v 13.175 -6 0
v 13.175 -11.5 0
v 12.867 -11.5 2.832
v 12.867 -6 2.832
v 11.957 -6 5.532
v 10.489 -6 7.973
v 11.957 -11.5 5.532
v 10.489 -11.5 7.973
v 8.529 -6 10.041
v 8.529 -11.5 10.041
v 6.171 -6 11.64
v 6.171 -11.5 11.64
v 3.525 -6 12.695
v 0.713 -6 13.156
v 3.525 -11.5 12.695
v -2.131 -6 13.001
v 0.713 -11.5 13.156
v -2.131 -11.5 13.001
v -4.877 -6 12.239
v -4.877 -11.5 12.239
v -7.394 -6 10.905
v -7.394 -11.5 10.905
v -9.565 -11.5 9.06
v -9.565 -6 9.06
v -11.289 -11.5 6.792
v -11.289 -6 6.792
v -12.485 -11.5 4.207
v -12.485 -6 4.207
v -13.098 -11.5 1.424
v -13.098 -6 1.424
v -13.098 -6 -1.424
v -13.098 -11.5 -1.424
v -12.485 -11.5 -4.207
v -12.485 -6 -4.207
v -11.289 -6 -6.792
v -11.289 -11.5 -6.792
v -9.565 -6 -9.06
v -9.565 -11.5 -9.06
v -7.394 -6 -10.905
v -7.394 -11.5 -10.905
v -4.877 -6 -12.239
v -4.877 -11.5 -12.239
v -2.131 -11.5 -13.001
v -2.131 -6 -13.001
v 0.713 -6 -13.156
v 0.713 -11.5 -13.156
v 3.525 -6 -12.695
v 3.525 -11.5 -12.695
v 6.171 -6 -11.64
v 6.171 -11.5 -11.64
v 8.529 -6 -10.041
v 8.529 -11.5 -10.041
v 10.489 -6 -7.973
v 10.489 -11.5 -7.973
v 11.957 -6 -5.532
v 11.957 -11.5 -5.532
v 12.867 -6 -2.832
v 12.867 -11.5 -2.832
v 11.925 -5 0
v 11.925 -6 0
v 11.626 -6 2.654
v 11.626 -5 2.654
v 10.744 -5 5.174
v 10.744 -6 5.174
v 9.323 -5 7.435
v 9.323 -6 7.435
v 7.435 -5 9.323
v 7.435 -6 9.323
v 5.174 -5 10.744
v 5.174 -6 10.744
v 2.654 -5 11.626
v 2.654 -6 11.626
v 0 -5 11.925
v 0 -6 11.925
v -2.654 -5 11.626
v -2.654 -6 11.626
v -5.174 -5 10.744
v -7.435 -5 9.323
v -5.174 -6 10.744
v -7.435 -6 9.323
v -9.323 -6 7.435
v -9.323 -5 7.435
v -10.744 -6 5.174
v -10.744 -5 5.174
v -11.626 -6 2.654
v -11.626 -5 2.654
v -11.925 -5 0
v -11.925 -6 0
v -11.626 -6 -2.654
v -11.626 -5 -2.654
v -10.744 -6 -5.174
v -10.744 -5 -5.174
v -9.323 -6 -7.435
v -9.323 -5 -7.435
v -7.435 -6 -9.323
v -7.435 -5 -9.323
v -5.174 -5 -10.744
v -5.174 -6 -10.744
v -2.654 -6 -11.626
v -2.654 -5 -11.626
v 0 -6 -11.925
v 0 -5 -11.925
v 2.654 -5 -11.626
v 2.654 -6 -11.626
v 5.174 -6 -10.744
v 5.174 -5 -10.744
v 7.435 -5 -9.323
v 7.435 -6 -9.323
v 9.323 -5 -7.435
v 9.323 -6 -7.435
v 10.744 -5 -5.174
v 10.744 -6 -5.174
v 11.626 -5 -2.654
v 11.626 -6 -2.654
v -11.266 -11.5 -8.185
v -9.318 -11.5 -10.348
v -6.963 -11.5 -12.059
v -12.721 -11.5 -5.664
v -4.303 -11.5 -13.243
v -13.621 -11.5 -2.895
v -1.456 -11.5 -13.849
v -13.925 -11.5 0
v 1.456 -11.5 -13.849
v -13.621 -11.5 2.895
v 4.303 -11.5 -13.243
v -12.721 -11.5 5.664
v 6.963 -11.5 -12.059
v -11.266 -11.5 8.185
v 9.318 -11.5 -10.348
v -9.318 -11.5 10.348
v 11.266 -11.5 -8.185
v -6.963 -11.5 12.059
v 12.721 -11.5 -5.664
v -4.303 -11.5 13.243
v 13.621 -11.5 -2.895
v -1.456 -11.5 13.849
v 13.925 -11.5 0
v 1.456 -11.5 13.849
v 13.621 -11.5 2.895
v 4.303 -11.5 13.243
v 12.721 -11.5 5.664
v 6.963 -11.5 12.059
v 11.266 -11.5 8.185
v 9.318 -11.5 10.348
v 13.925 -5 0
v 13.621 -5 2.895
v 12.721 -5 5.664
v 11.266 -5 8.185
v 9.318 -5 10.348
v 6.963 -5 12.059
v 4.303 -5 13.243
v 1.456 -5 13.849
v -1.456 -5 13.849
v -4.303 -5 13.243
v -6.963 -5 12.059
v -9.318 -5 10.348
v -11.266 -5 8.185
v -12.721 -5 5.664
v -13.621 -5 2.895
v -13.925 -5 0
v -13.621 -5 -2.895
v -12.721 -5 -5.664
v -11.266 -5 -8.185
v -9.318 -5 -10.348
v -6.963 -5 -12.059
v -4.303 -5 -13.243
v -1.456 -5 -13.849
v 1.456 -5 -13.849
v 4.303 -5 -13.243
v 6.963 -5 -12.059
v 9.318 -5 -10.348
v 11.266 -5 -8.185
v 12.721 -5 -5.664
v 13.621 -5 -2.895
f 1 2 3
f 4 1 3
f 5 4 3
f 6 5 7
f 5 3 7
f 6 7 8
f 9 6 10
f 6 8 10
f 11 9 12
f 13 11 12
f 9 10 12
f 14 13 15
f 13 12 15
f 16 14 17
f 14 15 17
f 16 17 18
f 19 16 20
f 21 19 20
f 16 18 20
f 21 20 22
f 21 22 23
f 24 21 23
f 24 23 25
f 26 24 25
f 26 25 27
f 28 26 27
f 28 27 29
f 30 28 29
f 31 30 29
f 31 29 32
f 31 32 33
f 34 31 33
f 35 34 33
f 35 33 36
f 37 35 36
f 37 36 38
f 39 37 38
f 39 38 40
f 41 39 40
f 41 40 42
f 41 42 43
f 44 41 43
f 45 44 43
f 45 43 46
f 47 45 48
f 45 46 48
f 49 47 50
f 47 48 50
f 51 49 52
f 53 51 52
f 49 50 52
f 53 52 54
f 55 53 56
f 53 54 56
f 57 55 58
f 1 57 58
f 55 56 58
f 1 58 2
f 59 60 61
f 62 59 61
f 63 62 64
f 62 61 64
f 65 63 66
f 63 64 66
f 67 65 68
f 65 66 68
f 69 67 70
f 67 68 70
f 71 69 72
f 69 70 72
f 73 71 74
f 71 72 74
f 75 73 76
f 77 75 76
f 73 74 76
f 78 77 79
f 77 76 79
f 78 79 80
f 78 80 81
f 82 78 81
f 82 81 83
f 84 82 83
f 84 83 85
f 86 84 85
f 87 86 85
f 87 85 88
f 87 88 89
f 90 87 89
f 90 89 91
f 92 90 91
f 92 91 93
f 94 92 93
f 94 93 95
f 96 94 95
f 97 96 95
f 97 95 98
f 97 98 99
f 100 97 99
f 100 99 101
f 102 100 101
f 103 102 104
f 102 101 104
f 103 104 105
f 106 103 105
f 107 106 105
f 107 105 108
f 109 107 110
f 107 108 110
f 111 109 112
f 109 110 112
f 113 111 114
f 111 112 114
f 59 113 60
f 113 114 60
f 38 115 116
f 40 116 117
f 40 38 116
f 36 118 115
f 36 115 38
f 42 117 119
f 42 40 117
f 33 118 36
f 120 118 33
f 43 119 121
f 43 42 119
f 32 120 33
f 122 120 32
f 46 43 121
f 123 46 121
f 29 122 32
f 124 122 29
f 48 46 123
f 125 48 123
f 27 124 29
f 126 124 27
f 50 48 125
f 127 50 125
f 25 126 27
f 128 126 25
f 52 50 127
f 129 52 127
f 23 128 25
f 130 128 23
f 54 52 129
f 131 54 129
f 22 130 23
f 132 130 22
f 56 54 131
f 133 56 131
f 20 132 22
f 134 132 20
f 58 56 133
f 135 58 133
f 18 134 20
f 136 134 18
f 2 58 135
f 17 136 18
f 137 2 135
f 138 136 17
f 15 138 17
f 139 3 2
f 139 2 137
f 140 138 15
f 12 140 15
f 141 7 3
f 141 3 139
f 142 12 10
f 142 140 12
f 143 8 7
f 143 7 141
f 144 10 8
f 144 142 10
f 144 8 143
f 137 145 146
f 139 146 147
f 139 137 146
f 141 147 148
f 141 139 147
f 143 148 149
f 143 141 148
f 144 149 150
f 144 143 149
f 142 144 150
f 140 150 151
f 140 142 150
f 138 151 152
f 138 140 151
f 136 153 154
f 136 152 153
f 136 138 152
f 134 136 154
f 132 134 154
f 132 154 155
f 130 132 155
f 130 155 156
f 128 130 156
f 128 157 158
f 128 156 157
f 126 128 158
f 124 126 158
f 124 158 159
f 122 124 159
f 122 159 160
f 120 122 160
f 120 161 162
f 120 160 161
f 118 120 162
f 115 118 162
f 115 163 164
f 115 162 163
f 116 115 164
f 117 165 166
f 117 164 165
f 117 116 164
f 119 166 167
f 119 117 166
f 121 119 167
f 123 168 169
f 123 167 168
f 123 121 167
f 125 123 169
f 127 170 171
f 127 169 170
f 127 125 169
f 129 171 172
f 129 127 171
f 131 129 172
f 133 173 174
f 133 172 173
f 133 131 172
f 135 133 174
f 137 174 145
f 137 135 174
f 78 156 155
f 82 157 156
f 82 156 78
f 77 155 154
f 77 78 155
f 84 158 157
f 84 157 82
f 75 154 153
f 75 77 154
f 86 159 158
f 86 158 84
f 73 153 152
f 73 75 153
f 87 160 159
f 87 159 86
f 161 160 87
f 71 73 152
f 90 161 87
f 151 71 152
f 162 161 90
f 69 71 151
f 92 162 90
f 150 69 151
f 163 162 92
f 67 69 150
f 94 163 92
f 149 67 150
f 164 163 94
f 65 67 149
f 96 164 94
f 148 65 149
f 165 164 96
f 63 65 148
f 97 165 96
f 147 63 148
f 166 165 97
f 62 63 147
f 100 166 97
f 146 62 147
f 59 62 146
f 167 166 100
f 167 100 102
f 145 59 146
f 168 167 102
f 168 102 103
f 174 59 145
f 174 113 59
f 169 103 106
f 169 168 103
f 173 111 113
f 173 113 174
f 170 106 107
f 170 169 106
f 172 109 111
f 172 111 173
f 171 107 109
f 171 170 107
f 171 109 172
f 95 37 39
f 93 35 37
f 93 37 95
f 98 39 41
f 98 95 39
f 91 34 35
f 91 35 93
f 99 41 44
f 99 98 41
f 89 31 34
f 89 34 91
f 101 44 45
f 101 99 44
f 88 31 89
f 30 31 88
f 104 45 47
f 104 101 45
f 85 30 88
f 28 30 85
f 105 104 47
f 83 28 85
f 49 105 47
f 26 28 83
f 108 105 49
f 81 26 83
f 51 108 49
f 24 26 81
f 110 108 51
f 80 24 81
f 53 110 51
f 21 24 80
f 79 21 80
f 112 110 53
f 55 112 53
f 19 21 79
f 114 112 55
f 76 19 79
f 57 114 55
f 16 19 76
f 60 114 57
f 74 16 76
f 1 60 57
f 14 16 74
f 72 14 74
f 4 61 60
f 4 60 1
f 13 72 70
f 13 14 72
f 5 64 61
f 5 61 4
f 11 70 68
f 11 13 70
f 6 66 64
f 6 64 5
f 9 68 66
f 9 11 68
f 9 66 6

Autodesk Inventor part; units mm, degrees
ref_plane "YZ Plane" through (0, 0, 0) normal (1, 0, 0) x (0, 1, 0)
ref_plane "XZ Plane" through (0, 0, 0) normal (0, 1, 0) x (-1, 0, 0)
ref_plane "XY Plane" through (0, 0, 0) normal (0, 0, 1) x (1, 0, 0)
sketch "Sketch1" plane through (0, 0, 0) normal (0, 0, 1) x (1, 0, 0)
  line L0 (0, 0) -> (13.925, 0)
  line L1 (13.925, 0) -> (13.925, -11.5)
  line L2 (13.925, -11.5) -> (0, -11.5) construction
  line L3 (0, -11.5) -> (0, 0) construction
  line L4 (13.925, 0) -> (0, 0)
  line L5 (0, 0) -> (0, -3.5)
  line L6 (0, -3.5) -> (13.925, -3.5)
  line L7 (13.925, -3.5) -> (13.925, 0)
  line L8 (13.925, 0) -> (11.925, 0)
  line L9 (11.925, 0) -> (11.925, -6)
  line L10 (11.925, -6) -> (13.925, -6)
  line L11 (13.925, -6) -> (13.925, 0)
  line L12 (13.925, -6) -> (13.175, -6)
  line L13 (13.175, -6) -> (13.175, -11.5)
  line L14 (13.175, -11.5) -> (13.925, -11.5)
  line L15 (13.925, -11.5) -> (13.925, -6)
  line L16 (0, 0) -> (2.5, 0)
  line L17 (2.5, 0) -> (2.5, 14.25)
  line L18 (2.5, 14.25) -> (0, 14.25)
  line L19 (0, 14.25) -> (0, 0)
  line L20 (0, -3.5) -> (2, -3.5)
  line L21 (2, -3.5) -> (2, -6.5)
  line L22 (2, -6.5) -> (0, -6.5)
  line L23 (0, -6.5) -> (0, -3.5)
  line L24 (2, -6.5) -> (4.5, -3.5)
  line L25 (0, -3.5) -> (1.5, -3.5)
  line L26 (1.5, -3.5) -> (1.5, -6.5)
  line L27 (1.5, -6.5) -> (0, -6.5)
  line L28 (0, -6.5) -> (0, -3.5)
  line L29 (1.5, -6.5) -> (0, -6.5)
  line L30 (0, -6.5) -> (0, -0.5)
  line L31 (0, -0.5) -> (1.5, -0.5)
  line L32 (1.5, -0.5) -> (1.5, -6.5)
  point P0 (11.925, -3.5)
  point P1 (1.5, -3.5)
  point P2 (1.5, -3.5)
  dimension "d0" = 13.925
  dimension "d1" = 11.5
  dimension "d2" = 3.5
  dimension "d3" = 2
  dimension "d5" = 5.5
  dimension "d6" = 0.75
  dimension "d7" = 2.5
  dimension "d8" = 14.25
  dimension "d13" = 2
  dimension "d14" = 3
  dimension "d15" = 4.5
  dimension "d16" = 1.5
  dimension "d53" = 6
revolve "Revolution1" add sketch "Sketch1" angle 360 about axis through (0, 14.25, 0) along (0, -1, 0) contours L19 L18 L17 L0 | L0 L9 L6 L32 L31 L5 | L0 L1 L6 L9 | L6 L1 L10 L9 | L6 L21 L22 L26 | L24 L21 L6 | L1 L14 L13 L10
chamfer "Chamfer1" distance 2 angle 45 1 edges at (-13.925, 0, 0)
sketch "Sketch4" plane through (0, -3.5, 0) normal (0, -1, 0) x (1, 0, 0)
  line L0 (0, 0) -> (0, 13.925) construction
  circle A0 centre (0, 0) radius 13.925 projected
  circle A1 centre (0, 0) radius 11.925 projected
  circle A2 centre (0, 0) radius 4.5 projected
  arc A3 (-1.9387, 6.0086) -> (1.9387, 6.0086) centre (0, 6.5) ccw
  line L1 (-1, -13.889) -> (1, -13.889) construction
  line L2 (1, -13.889) -> (1, -4.3875) construction
  line L3 (1, -4.3875) -> (-1, -4.3875) construction
  line L4 (-1, -4.3875) -> (-1, -13.889) construction
  line L5 (-1, -13.889) -> (1, -4.3875) construction
  line L6 (1, -13.889) -> (-1, -4.3875) construction
  circle A4 centre (0, 0) radius 4.5 projected
  circle A5 centre (0, 0) radius 11.925 projected
  line L7 (-3.319, 11.4538) -> (-1.9387, 6.0086)
  line L8 (3.4812, 12.0939) -> (1.9387, 6.0086)
  line L9 (2.0542, -4.0038) -> (8.1617, -11.2824) construction
  line L10 (9.6938, -9.9968) -> (3.5863, -2.7182) construction
  line L11 (4.1472, -1.7467) -> (13.5044, -3.3966) construction
  line L12 (13.8517, -1.427) -> (4.4945, 0.2229) construction
  line L13 (4.2997, 1.3277) -> (12.5283, 6.0785) construction
  line L14 (11.5283, 7.8105) -> (3.2997, 3.0598) construction
  line L15 (2.4403, 3.7809) -> (5.69, 12.7094) construction
  line L16 (3.8106, 13.3935) -> (0.5609, 4.4649) construction
  line L17 (-0.5609, 4.4649) -> (-3.8106, 13.3935) construction
  line L18 (-5.69, 12.7094) -> (-2.4403, 3.7809) construction
  line L19 (-3.2997, 3.0598) -> (-11.5283, 7.8105) construction
  line L20 (-12.5283, 6.0785) -> (-4.2997, 1.3277) construction
  line L21 (-4.4945, 0.2229) -> (-13.8517, -1.427) construction
  line L22 (-13.5044, -3.3966) -> (-4.1472, -1.7467) construction
  line L23 (-3.5863, -2.7182) -> (-9.6938, -9.9968) construction
  line L24 (-8.1617, -11.2824) -> (-2.0542, -4.0038) construction
  line L25 (-5.1071, 11.5022) -> (-2.3771, 5.849)
  arc A6 (-5.3474, 3.3567) -> (-2.3771, 5.849) centre (-4.1781, 4.9793) ccw
  line L26 (-9.9049, 6.6407) -> (-5.3474, 3.3567)
  line L27 (-11.3057, 5.5284) -> (-5.5806, 2.9526)
  arc A7 (-6.2539, -0.8659) -> (-5.5806, 2.9526) centre (-6.4013, 1.1287) ccw
  line L28 (-11.8561, -1.2796) -> (-6.2539, -0.8659)
  line L29 (-12.2143, -3.0321) -> (-6.1729, -1.3253)
  arc A8 (-4.2342, -4.6832) -> (-6.1729, -1.3253) centre (-5.6292, -3.25) ccw
  line L30 (-8.2598, -8.6012) -> (-4.2342, -4.6832)
  line L31 (-7.4077, -10.1739) -> (-3.8768, -4.9831)
  arc A9 (-0.2333, -6.3093) -> (-3.8768, -4.9831) centre (-2.2231, -6.108) ccw
  line L32 (-0.7986, -11.8982) -> (-0.2333, -6.3093)
  line L33 (0.8651, -12.5552) -> (0.2333, -6.3093)
  arc A10 (3.8768, -4.9831) -> (0.2333, -6.3093) centre (2.2231, -6.108) ccw
  line L34 (7.0363, -9.6279) -> (3.8768, -4.9831)
  line L35 (8.733, -9.0618) -> (4.2342, -4.6832)
  arc A11 (6.1729, -1.3253) -> (4.2342, -4.6832) centre (5.6292, -3.25) ccw
  line L36 (11.5788, -2.8526) -> (6.1729, -1.3253)
  line L37 (12.5147, -1.3283) -> (6.2539, -0.8659)
  arc A12 (5.5806, 2.9526) -> (6.2539, -0.8659) centre (6.4013, 1.1287) ccw
  line L38 (10.7035, 5.2575) -> (5.5806, 2.9526)
  line L39 (10.4406, 7.0268) -> (5.3474, 3.3567)
  arc A13 (2.3771, 5.849) -> (5.3474, 3.3567) centre (4.1781, 4.9793) ccw
  line L40 (4.8199, 10.9075) -> (2.3771, 5.849)
  arc A14 (-2.2939, 11.7023) -> (-3.0709, 10.4752) centre (-2.1016, 10.721) ccw
  arc A15 (3.0709, 10.4752) -> (2.2939, 11.7023) centre (2.1016, 10.721) ccw
  arc A16 (-4.3809, 9.9985) -> (-5.7648, 10.439) centre (-5.2814, 9.5636) ccw
  arc A17 (-9.2793, 7.49) -> (-9.0858, 6.0506) centre (-8.5012, 6.8619) ccw
  arc A18 (-9.7828, 4.8433) -> (-11.1262, 4.2912) centre (-10.1932, 3.9313) ccw
  arc A19 (-11.9228, -0.227) -> (-10.8494, -1.2053) centre (-10.923, -0.208) ccw
  arc A20 (-10.6073, -2.5781) -> (-11.2814, -3.8645) centre (-10.3354, -3.5405) ccw
  arc A21 (-8.9875, -7.8378) -> (-7.5364, -7.8971) centre (-8.2338, -7.1805) ccw
  arc A22 (-6.4685, -8.7932) -> (-6.158, -10.212) centre (-5.6416, -9.3556) ccw
  arc A23 (-1.8468, -11.7811) -> (-0.697, -10.8938) centre (-1.6919, -10.7932) ccw
  arc A24 (0.697, -10.8938) -> (1.8468, -11.7811) centre (1.6919, -10.7932) ccw
  arc A25 (6.158, -10.212) -> (6.4685, -8.7932) centre (5.6416, -9.3556) ccw
  arc A26 (7.5364, -7.8971) -> (8.9875, -7.8378) centre (8.2338, -7.1805) ccw
  arc A27 (11.2814, -3.8645) -> (10.6073, -2.5781) centre (10.3354, -3.5405) ccw
  arc A28 (10.8494, -1.2053) -> (11.9228, -0.227) centre (10.923, -0.208) ccw
  arc A29 (11.1262, 4.2912) -> (9.7828, 4.8433) centre (10.1932, 3.9313) ccw
  arc A30 (9.0858, 6.0506) -> (9.2793, 7.49) centre (8.5012, 6.8619) ccw
  arc A31 (5.7648, 10.439) -> (4.3809, 9.9985) centre (5.2814, 9.5636) ccw
  point P0 (0, -9.1383)
  point P1 (-5.69, 12.7094)
  point P2 (-11.5283, 7.8105)
  point P3 (-12.5283, 6.0785)
  point P4 (-13.8517, -1.427)
  point P5 (-13.5044, -3.3966)
  point P6 (-8.1617, -11.2824)
  point P7 (-1, -13.889)
  point P8 (1, -13.889)
  point P9 (8.1617, -11.2824)
  point P10 (9.6938, -9.9968)
  point P11 (13.5044, -3.3966)
  point P12 (13.8517, -1.427)
  point P13 (12.5283, 6.0785)
  point P14 (11.5283, 7.8105)
  point P15 (5.69, 12.7094)
  point P16 (9.0858, 6.0506)
  point P17 (11.1262, 4.2912)
  point P18 (10.8494, -1.2053)
  point P19 (11.9228, -0.227)
  point P20 (10.6073, -2.5781)
  point P21 (8.9875, -7.8378)
  point P22 (6.4685, -8.7932)
  point P23 (0.697, -10.8938)
  point P24 (1.8468, -11.7811)
  point P25 (-1.8468, -11.7811)
  point P26 (-0.697, -10.8938)
  point P27 (-10.6073, -2.5781)
  point P28 (-10.8494, -1.2053)
  point P29 (-9.2793, 7.49)
  point P30 (-9.0858, 6.0506)
  point P31 (-5.7648, 10.439)
  point P32 (2.2939, 11.7023)
  point P33 (-2.2939, 11.7023)
  dimension "d31" = 4
  dimension "d32" = 2
  dimension "d39" = 360
  dimension "d43" = 360
  dimension "d45" = 2
  dimension "d48" = 360
extrude "Extrusion2" cut sketch "Sketch4" against normal blind 3 contours A1 A28 L37 A12 L38 A29 | A30 L39 A13 L40 A31 A1 | A1 A26 L35 A11 L36 A27 | A3 L7 A14 A1 A15 L8 | A10 L34 A25 A1 A24 L33 | A6 L26 A17 A1 A16 L25 | A9 L32 A23 A1 A22 L31 | A7 L28 A19 A1 A18 L27 | A8 L30 A21 A1 A20 L29
sketch "Sketch2" plane through (0, 0, 0) normal (0, 1, 0) x (1, 0, 0)
  circle A0 centre (0, 0) radius 1.5 projected
  circle A1 centre (0, 0) radius 11.5
  line L0 (0, 0) -> (0, 13.925) construction
  circle A2 centre (0, 0) radius 13.925 projected
  line L1 (-1, 16.3936) -> (-1, 11.4564)
  line L2 (-1, 11.4564) -> (1, 11.4564) construction
  line L3 (1, 11.4564) -> (1, 16.3936)
  line L4 (1, 16.3936) -> (-1, 16.3936)
  line L5 (-1, 16.3936) -> (1, 11.4564) construction
  line L6 (-1, 11.4564) -> (1, 16.3936) construction
  line L7 (-11.3036, 11.9154) -> (-8.1301, 8.1334)
  line L8 (-8.1301, 8.1334) -> (-6.598, 9.4189) construction
  line L9 (-6.598, 9.4189) -> (-9.7715, 13.201)
  line L10 (-9.7715, 13.201) -> (-11.3036, 11.9154)
  line L11 (-16.3182, 1.8619) -> (-11.456, 1.0046)
  line L12 (-11.456, 1.0046) -> (-11.1087, 2.9742) construction
  line L13 (-11.1087, 2.9742) -> (-15.9709, 3.8315)
  line L14 (-15.9709, 3.8315) -> (-16.3182, 1.8619)
  line L15 (-13.6972, -9.0628) -> (-9.4216, -6.5942)
  line L16 (-9.4216, -6.5942) -> (-10.4216, -4.8622) construction
  line L17 (-10.4216, -4.8622) -> (-14.6972, -7.3308)
  line L18 (-14.6972, -7.3308) -> (-13.6972, -9.0628)
  line L19 (-4.6672, -15.7469) -> (-2.9786, -11.1076)
  line L20 (-2.9786, -11.1076) -> (-4.858, -10.4235) construction
  line L21 (-4.858, -10.4235) -> (-6.5466, -15.0629)
  line L22 (-6.5466, -15.0629) -> (-4.6672, -15.7469)
  line L23 (6.5466, -15.0629) -> (4.858, -10.4235)
  line L24 (4.858, -10.4235) -> (2.9786, -11.1076) construction
  line L25 (2.9786, -11.1076) -> (4.6672, -15.7469)
  line L26 (4.6672, -15.7469) -> (6.5466, -15.0629)
  line L27 (14.6972, -7.3308) -> (10.4216, -4.8622)
  line L28 (10.4216, -4.8622) -> (9.4216, -6.5942) construction
  line L29 (9.4216, -6.5942) -> (13.6972, -9.0628)
  line L30 (13.6972, -9.0628) -> (14.6972, -7.3308)
  line L31 (15.9709, 3.8315) -> (11.1087, 2.9742)
  line L32 (11.1087, 2.9742) -> (11.456, 1.0046) construction
  line L33 (11.456, 1.0046) -> (16.3182, 1.8619)
  line L34 (16.3182, 1.8619) -> (15.9709, 3.8315)
  line L35 (9.7715, 13.201) -> (6.598, 9.4189)
  line L36 (6.598, 9.4189) -> (8.1301, 8.1334) construction
  line L37 (8.1301, 8.1334) -> (11.3036, 11.9154)
  line L38 (11.3036, 11.9154) -> (9.7715, 13.201)
  arc A3 (6.3519, 11.0119) -> (2.2125, 12.5185) centre (0, 0) ccw construction
  arc A4 (6.9577, 12.0622) -> (2.4235, 13.7125) centre (0, 0) ccw
  arc A5 (5.746, 9.9616) -> (2.0015, 11.3245) centre (0, 0) ccw
  arc A6 (5.746, 9.9616) -> (6.9577, 12.0622) centre (6.3519, 11.0119) ccw
  arc A7 (2.4235, 13.7125) -> (2.0015, 11.3245) centre (2.2125, 12.5185) ccw
  arc A8 (-6.9577, 12.0622) -> (-5.746, 9.9616) centre (-6.3519, 11.0119) ccw
  arc A9 (-2.4235, 13.7125) -> (-6.9577, 12.0622) centre (0, 0) ccw
  arc A10 (-2.2125, 12.5185) -> (-6.3519, 11.0119) centre (0, 0) ccw construction
  arc A11 (-2.0015, 11.3245) -> (-2.4235, 13.7125) centre (-2.2125, 12.5185) ccw
  arc A12 (-2.0015, 11.3245) -> (-5.746, 9.9616) centre (0, 0) ccw
  arc A13 (-13.0833, 4.7679) -> (-10.8049, 3.9375) centre (-11.9441, 4.3527) ccw
  arc A14 (-10.6707, 8.9466) -> (-13.0833, 4.7679) centre (0, 0) ccw
  arc A15 (-9.7416, 8.1675) -> (-11.9441, 4.3527) centre (0, 0) ccw construction
  arc A16 (-8.8125, 7.3885) -> (-10.6707, 8.9466) centre (-9.7416, 8.1675) ccw
  arc A17 (-8.8125, 7.3885) -> (-10.8049, 3.9375) centre (0, 0) ccw
  arc A18 (-13.0871, -4.7574) -> (-10.808, -3.9289) centre (-11.9476, -4.3432) ccw
  arc A19 (-13.925, -0.0056) -> (-13.0871, -4.7574) centre (0, 0) ccw
  arc A20 (-12.7125, -0.0051) -> (-11.9476, -4.3432) centre (0, 0) ccw construction
  arc A21 (-11.5, -0.0046) -> (-13.925, -0.0056) centre (-12.7125, -0.0051) ccw
  arc A22 (-11.5, -0.0046) -> (-10.808, -3.9289) centre (0, 0) ccw
  arc A23 (-6.9673, -12.0566) -> (-5.754, -9.957) centre (-6.3606, -11.0068) ccw
  arc A24 (-10.6636, -8.9551) -> (-6.9673, -12.0566) centre (0, 0) ccw
  arc A25 (-9.7351, -8.1753) -> (-6.3606, -11.0068) centre (0, 0) ccw construction
  arc A26 (-8.8066, -7.3956) -> (-10.6636, -8.9551) centre (-9.7351, -8.1753) ccw
  arc A27 (-8.8066, -7.3956) -> (-5.754, -9.957) centre (0, 0) ccw
  arc A28 (2.4126, -13.7144) -> (1.9924, -11.3261) centre (2.2025, -12.5202) ccw
  arc A29 (-2.4126, -13.7144) -> (2.4126, -13.7144) centre (0, 0) ccw
  arc A30 (-2.2025, -12.5202) -> (2.2025, -12.5202) centre (0, 0) ccw construction
  arc A31 (-1.9924, -11.3261) -> (-2.4126, -13.7144) centre (-2.2025, -12.5202) ccw
  arc A32 (-1.9924, -11.3261) -> (1.9924, -11.3261) centre (0, 0) ccw
  arc A33 (10.6636, -8.9551) -> (8.8066, -7.3956) centre (9.7351, -8.1753) ccw
  arc A34 (6.9673, -12.0566) -> (10.6636, -8.9551) centre (0, 0) ccw
  arc A35 (6.3606, -11.0068) -> (9.7351, -8.1753) centre (0, 0) ccw construction
  arc A36 (5.754, -9.957) -> (6.9673, -12.0566) centre (6.3606, -11.0068) ccw
  arc A37 (5.754, -9.957) -> (8.8066, -7.3956) centre (0, 0) ccw
  arc A38 (13.925, -0.0056) -> (11.5, -0.0046) centre (12.7125, -0.0051) ccw
  arc A39 (13.0871, -4.7574) -> (13.925, -0.0056) centre (0, 0) ccw
  arc A40 (11.9476, -4.3432) -> (12.7125, -0.0051) centre (0, 0) ccw construction
  arc A41 (10.808, -3.9289) -> (13.0871, -4.7574) centre (11.9476, -4.3432) ccw
  arc A42 (10.808, -3.9289) -> (11.5, -0.0046) centre (0, 0) ccw
  arc A43 (10.6707, 8.9466) -> (8.8125, 7.3885) centre (9.7416, 8.1675) ccw
  arc A44 (13.0833, 4.7679) -> (10.6707, 8.9466) centre (0, 0) ccw
  arc A45 (11.9441, 4.3527) -> (9.7416, 8.1675) centre (0, 0) ccw construction
  arc A46 (10.8049, 3.9375) -> (13.0833, 4.7679) centre (11.9441, 4.3527) ccw
  arc A47 (10.8049, 3.9375) -> (8.8125, 7.3885) centre (0, 0) ccw
  point P0 (-8.9508, 10.6672)
  point P1 (-13.7134, 2.4181)
  point P2 (-12.0594, -6.9625)
  point P3 (-4.7626, -13.0852)
  point P4 (4.7626, -13.0852)
  point P5 (12.0594, -6.9625)
  point P6 (13.7134, 2.4181)
  point P7 (8.9508, 10.6672)
  point P8 (-1, 11.4564)
  point P9 (-8.1301, 8.1334)
  point P10 (-11.456, 1.0046)
  point P11 (-9.4216, -6.5942)
  point P12 (-2.9786, -11.1076)
  point P13 (4.858, -10.4235)
  point P14 (10.4216, -4.8622)
  point P15 (11.1087, 2.9742)
  point P16 (-8.1617, 11.2824)
  point P17 (-7.2807, 10.2325)
  point P18 (-5.746, 9.9616)
  point P19 (-2.0015, 11.3245)
  point P20 (-1, 12.5185)
  point P21 (-1, 13.889)
  point P22 (-13.5044, 3.3966)
  point P23 (-12.1547, 3.1586)
  point P24 (-8.8125, 7.3885)
  point P25 (-8.8128, 8.9469)
  point P26 (-9.6938, 9.9968)
  point P27 (-12.5283, -6.0785)
  point P28 (-11.3413, -5.3932)
  point P29 (-10.808, -3.9289)
  point P30 (-11.5, -0.0046)
  point P31 (-12.502, 1.189)
  point P32 (-13.8517, 1.427)
  point P33 (-5.69, -12.7094)
  point P34 (-5.2213, -11.4215)
  point P35 (-5.754, -9.957)
  point P36 (-8.8066, -7.3956)
  point P37 (-10.3413, -7.1253)
  point P38 (-11.5283, -7.8105)
  point P39 (3.8106, -13.3935)
  point P40 (3.3419, -12.1055)
  point P41 (1.9924, -11.3261)
  point P42 (-3.3419, -12.1055)
  point P43 (-3.8106, -13.3935)
  point P44 (11.5283, -7.8105)
  point P45 (10.3413, -7.1253)
  point P46 (5.754, -9.957)
  point P47 (5.2213, -11.4215)
  point P48 (5.69, -12.7094)
  point P49 (13.8517, 1.427)
  point P50 (12.502, 1.189)
  point P51 (11.5, -0.0046)
  point P52 (10.808, -3.9289)
  point P53 (11.3413, -5.3932)
  point P54 (12.5283, -6.0785)
  point P55 (9.6938, 9.9968)
  point P56 (8.8128, 8.9469)
  point P57 (8.8125, 7.3885)
  point P58 (10.8049, 3.9375)
  point P59 (12.1547, 3.1586)
  point P60 (13.5044, 3.3966)
  point P61 (1, 12.5185)
  point P62 (2.0015, 11.3245)
  point P63 (7.2807, 10.2325)
  point P64 (8.1617, 11.2824)
  point P65 (1, 13.889)
  dimension "d17" = 23
  dimension "d18" = 2
  dimension "d21" = 360
  dimension "d25" = 360
extrude "Extrusion1" cut sketch "Sketch2" against normal blind 5 contours A38 A2 A41 A1 | L33 A2 A38 | A1 A43 A2 A46 | A46 A2 L31 | A41 A2 L27 | L37 A2 A43 | A33 A2 A36 A1 | L29 A2 A33 | A1 A7 A2 A6 | A6 A2 L35 | A36 A2 L23 | L3 A2 A7 | A28 A2 A31 A1 | L25 A2 A28 | A1 A8 A2 A11 | A11 A2 L1 | A31 A2 L19 | L9 A2 A8 | A23 A2 A26 A1 | L21 A2 A23 | A1 A13 A2 A16 | A16 A2 L7 | A26 A2 L15 | L13 A2 A13 | A18 A2 A21 A1 | L17 A2 A18 | A21 A2 L11
thread "Thread1" size "M5x0.8" class "6g" standard "ANSI Metric M Profile" length 10
sketch "Sketch5" plane through (0, 0, 0) normal (0, 0, 1) x (1, 0, 0)
  line L0 (0, 0) -> (0, -11.5) construction
  line L1 (-13.175, -11.5) -> (13.175, -11.5) projected
  circle A0 centre (0, -2) radius 1.25
  line L2 (1.9924, 0) -> (-1.9924, 0) projected
  point P0 (0, -0.75)
  dimension "d52" = 2.5
  dimension "d55" = 0.75
extrude "Extrusion3" cut sketch "Sketch5" along normal through all
thread "Thread2" size "M2.5x0.45" class "6H" standard "ANSI Metric M Profile" length 5.0038
sketch "Sketch6" plane through (0, 14.25, 0) normal (0, 1, 0) x (1, 0, 0)
  circle A0 centre (0, 0) radius 20
  dimension "d60" = 40
extrude "Extrusion4" cut sketch "Sketch6" against normal up to surface (19.25 mm away)
sketch "Sketch7" plane through (0, -5, 0) normal (0, 1, 0) x (1, 0, 0)
  circle A0 centre (0, 0) radius 5
  dimension "d63" = 10
extrude "Extrusion5" cut sketch "Sketch7" against normal through all
properties part number "CAN" material "Stainless Steel"
